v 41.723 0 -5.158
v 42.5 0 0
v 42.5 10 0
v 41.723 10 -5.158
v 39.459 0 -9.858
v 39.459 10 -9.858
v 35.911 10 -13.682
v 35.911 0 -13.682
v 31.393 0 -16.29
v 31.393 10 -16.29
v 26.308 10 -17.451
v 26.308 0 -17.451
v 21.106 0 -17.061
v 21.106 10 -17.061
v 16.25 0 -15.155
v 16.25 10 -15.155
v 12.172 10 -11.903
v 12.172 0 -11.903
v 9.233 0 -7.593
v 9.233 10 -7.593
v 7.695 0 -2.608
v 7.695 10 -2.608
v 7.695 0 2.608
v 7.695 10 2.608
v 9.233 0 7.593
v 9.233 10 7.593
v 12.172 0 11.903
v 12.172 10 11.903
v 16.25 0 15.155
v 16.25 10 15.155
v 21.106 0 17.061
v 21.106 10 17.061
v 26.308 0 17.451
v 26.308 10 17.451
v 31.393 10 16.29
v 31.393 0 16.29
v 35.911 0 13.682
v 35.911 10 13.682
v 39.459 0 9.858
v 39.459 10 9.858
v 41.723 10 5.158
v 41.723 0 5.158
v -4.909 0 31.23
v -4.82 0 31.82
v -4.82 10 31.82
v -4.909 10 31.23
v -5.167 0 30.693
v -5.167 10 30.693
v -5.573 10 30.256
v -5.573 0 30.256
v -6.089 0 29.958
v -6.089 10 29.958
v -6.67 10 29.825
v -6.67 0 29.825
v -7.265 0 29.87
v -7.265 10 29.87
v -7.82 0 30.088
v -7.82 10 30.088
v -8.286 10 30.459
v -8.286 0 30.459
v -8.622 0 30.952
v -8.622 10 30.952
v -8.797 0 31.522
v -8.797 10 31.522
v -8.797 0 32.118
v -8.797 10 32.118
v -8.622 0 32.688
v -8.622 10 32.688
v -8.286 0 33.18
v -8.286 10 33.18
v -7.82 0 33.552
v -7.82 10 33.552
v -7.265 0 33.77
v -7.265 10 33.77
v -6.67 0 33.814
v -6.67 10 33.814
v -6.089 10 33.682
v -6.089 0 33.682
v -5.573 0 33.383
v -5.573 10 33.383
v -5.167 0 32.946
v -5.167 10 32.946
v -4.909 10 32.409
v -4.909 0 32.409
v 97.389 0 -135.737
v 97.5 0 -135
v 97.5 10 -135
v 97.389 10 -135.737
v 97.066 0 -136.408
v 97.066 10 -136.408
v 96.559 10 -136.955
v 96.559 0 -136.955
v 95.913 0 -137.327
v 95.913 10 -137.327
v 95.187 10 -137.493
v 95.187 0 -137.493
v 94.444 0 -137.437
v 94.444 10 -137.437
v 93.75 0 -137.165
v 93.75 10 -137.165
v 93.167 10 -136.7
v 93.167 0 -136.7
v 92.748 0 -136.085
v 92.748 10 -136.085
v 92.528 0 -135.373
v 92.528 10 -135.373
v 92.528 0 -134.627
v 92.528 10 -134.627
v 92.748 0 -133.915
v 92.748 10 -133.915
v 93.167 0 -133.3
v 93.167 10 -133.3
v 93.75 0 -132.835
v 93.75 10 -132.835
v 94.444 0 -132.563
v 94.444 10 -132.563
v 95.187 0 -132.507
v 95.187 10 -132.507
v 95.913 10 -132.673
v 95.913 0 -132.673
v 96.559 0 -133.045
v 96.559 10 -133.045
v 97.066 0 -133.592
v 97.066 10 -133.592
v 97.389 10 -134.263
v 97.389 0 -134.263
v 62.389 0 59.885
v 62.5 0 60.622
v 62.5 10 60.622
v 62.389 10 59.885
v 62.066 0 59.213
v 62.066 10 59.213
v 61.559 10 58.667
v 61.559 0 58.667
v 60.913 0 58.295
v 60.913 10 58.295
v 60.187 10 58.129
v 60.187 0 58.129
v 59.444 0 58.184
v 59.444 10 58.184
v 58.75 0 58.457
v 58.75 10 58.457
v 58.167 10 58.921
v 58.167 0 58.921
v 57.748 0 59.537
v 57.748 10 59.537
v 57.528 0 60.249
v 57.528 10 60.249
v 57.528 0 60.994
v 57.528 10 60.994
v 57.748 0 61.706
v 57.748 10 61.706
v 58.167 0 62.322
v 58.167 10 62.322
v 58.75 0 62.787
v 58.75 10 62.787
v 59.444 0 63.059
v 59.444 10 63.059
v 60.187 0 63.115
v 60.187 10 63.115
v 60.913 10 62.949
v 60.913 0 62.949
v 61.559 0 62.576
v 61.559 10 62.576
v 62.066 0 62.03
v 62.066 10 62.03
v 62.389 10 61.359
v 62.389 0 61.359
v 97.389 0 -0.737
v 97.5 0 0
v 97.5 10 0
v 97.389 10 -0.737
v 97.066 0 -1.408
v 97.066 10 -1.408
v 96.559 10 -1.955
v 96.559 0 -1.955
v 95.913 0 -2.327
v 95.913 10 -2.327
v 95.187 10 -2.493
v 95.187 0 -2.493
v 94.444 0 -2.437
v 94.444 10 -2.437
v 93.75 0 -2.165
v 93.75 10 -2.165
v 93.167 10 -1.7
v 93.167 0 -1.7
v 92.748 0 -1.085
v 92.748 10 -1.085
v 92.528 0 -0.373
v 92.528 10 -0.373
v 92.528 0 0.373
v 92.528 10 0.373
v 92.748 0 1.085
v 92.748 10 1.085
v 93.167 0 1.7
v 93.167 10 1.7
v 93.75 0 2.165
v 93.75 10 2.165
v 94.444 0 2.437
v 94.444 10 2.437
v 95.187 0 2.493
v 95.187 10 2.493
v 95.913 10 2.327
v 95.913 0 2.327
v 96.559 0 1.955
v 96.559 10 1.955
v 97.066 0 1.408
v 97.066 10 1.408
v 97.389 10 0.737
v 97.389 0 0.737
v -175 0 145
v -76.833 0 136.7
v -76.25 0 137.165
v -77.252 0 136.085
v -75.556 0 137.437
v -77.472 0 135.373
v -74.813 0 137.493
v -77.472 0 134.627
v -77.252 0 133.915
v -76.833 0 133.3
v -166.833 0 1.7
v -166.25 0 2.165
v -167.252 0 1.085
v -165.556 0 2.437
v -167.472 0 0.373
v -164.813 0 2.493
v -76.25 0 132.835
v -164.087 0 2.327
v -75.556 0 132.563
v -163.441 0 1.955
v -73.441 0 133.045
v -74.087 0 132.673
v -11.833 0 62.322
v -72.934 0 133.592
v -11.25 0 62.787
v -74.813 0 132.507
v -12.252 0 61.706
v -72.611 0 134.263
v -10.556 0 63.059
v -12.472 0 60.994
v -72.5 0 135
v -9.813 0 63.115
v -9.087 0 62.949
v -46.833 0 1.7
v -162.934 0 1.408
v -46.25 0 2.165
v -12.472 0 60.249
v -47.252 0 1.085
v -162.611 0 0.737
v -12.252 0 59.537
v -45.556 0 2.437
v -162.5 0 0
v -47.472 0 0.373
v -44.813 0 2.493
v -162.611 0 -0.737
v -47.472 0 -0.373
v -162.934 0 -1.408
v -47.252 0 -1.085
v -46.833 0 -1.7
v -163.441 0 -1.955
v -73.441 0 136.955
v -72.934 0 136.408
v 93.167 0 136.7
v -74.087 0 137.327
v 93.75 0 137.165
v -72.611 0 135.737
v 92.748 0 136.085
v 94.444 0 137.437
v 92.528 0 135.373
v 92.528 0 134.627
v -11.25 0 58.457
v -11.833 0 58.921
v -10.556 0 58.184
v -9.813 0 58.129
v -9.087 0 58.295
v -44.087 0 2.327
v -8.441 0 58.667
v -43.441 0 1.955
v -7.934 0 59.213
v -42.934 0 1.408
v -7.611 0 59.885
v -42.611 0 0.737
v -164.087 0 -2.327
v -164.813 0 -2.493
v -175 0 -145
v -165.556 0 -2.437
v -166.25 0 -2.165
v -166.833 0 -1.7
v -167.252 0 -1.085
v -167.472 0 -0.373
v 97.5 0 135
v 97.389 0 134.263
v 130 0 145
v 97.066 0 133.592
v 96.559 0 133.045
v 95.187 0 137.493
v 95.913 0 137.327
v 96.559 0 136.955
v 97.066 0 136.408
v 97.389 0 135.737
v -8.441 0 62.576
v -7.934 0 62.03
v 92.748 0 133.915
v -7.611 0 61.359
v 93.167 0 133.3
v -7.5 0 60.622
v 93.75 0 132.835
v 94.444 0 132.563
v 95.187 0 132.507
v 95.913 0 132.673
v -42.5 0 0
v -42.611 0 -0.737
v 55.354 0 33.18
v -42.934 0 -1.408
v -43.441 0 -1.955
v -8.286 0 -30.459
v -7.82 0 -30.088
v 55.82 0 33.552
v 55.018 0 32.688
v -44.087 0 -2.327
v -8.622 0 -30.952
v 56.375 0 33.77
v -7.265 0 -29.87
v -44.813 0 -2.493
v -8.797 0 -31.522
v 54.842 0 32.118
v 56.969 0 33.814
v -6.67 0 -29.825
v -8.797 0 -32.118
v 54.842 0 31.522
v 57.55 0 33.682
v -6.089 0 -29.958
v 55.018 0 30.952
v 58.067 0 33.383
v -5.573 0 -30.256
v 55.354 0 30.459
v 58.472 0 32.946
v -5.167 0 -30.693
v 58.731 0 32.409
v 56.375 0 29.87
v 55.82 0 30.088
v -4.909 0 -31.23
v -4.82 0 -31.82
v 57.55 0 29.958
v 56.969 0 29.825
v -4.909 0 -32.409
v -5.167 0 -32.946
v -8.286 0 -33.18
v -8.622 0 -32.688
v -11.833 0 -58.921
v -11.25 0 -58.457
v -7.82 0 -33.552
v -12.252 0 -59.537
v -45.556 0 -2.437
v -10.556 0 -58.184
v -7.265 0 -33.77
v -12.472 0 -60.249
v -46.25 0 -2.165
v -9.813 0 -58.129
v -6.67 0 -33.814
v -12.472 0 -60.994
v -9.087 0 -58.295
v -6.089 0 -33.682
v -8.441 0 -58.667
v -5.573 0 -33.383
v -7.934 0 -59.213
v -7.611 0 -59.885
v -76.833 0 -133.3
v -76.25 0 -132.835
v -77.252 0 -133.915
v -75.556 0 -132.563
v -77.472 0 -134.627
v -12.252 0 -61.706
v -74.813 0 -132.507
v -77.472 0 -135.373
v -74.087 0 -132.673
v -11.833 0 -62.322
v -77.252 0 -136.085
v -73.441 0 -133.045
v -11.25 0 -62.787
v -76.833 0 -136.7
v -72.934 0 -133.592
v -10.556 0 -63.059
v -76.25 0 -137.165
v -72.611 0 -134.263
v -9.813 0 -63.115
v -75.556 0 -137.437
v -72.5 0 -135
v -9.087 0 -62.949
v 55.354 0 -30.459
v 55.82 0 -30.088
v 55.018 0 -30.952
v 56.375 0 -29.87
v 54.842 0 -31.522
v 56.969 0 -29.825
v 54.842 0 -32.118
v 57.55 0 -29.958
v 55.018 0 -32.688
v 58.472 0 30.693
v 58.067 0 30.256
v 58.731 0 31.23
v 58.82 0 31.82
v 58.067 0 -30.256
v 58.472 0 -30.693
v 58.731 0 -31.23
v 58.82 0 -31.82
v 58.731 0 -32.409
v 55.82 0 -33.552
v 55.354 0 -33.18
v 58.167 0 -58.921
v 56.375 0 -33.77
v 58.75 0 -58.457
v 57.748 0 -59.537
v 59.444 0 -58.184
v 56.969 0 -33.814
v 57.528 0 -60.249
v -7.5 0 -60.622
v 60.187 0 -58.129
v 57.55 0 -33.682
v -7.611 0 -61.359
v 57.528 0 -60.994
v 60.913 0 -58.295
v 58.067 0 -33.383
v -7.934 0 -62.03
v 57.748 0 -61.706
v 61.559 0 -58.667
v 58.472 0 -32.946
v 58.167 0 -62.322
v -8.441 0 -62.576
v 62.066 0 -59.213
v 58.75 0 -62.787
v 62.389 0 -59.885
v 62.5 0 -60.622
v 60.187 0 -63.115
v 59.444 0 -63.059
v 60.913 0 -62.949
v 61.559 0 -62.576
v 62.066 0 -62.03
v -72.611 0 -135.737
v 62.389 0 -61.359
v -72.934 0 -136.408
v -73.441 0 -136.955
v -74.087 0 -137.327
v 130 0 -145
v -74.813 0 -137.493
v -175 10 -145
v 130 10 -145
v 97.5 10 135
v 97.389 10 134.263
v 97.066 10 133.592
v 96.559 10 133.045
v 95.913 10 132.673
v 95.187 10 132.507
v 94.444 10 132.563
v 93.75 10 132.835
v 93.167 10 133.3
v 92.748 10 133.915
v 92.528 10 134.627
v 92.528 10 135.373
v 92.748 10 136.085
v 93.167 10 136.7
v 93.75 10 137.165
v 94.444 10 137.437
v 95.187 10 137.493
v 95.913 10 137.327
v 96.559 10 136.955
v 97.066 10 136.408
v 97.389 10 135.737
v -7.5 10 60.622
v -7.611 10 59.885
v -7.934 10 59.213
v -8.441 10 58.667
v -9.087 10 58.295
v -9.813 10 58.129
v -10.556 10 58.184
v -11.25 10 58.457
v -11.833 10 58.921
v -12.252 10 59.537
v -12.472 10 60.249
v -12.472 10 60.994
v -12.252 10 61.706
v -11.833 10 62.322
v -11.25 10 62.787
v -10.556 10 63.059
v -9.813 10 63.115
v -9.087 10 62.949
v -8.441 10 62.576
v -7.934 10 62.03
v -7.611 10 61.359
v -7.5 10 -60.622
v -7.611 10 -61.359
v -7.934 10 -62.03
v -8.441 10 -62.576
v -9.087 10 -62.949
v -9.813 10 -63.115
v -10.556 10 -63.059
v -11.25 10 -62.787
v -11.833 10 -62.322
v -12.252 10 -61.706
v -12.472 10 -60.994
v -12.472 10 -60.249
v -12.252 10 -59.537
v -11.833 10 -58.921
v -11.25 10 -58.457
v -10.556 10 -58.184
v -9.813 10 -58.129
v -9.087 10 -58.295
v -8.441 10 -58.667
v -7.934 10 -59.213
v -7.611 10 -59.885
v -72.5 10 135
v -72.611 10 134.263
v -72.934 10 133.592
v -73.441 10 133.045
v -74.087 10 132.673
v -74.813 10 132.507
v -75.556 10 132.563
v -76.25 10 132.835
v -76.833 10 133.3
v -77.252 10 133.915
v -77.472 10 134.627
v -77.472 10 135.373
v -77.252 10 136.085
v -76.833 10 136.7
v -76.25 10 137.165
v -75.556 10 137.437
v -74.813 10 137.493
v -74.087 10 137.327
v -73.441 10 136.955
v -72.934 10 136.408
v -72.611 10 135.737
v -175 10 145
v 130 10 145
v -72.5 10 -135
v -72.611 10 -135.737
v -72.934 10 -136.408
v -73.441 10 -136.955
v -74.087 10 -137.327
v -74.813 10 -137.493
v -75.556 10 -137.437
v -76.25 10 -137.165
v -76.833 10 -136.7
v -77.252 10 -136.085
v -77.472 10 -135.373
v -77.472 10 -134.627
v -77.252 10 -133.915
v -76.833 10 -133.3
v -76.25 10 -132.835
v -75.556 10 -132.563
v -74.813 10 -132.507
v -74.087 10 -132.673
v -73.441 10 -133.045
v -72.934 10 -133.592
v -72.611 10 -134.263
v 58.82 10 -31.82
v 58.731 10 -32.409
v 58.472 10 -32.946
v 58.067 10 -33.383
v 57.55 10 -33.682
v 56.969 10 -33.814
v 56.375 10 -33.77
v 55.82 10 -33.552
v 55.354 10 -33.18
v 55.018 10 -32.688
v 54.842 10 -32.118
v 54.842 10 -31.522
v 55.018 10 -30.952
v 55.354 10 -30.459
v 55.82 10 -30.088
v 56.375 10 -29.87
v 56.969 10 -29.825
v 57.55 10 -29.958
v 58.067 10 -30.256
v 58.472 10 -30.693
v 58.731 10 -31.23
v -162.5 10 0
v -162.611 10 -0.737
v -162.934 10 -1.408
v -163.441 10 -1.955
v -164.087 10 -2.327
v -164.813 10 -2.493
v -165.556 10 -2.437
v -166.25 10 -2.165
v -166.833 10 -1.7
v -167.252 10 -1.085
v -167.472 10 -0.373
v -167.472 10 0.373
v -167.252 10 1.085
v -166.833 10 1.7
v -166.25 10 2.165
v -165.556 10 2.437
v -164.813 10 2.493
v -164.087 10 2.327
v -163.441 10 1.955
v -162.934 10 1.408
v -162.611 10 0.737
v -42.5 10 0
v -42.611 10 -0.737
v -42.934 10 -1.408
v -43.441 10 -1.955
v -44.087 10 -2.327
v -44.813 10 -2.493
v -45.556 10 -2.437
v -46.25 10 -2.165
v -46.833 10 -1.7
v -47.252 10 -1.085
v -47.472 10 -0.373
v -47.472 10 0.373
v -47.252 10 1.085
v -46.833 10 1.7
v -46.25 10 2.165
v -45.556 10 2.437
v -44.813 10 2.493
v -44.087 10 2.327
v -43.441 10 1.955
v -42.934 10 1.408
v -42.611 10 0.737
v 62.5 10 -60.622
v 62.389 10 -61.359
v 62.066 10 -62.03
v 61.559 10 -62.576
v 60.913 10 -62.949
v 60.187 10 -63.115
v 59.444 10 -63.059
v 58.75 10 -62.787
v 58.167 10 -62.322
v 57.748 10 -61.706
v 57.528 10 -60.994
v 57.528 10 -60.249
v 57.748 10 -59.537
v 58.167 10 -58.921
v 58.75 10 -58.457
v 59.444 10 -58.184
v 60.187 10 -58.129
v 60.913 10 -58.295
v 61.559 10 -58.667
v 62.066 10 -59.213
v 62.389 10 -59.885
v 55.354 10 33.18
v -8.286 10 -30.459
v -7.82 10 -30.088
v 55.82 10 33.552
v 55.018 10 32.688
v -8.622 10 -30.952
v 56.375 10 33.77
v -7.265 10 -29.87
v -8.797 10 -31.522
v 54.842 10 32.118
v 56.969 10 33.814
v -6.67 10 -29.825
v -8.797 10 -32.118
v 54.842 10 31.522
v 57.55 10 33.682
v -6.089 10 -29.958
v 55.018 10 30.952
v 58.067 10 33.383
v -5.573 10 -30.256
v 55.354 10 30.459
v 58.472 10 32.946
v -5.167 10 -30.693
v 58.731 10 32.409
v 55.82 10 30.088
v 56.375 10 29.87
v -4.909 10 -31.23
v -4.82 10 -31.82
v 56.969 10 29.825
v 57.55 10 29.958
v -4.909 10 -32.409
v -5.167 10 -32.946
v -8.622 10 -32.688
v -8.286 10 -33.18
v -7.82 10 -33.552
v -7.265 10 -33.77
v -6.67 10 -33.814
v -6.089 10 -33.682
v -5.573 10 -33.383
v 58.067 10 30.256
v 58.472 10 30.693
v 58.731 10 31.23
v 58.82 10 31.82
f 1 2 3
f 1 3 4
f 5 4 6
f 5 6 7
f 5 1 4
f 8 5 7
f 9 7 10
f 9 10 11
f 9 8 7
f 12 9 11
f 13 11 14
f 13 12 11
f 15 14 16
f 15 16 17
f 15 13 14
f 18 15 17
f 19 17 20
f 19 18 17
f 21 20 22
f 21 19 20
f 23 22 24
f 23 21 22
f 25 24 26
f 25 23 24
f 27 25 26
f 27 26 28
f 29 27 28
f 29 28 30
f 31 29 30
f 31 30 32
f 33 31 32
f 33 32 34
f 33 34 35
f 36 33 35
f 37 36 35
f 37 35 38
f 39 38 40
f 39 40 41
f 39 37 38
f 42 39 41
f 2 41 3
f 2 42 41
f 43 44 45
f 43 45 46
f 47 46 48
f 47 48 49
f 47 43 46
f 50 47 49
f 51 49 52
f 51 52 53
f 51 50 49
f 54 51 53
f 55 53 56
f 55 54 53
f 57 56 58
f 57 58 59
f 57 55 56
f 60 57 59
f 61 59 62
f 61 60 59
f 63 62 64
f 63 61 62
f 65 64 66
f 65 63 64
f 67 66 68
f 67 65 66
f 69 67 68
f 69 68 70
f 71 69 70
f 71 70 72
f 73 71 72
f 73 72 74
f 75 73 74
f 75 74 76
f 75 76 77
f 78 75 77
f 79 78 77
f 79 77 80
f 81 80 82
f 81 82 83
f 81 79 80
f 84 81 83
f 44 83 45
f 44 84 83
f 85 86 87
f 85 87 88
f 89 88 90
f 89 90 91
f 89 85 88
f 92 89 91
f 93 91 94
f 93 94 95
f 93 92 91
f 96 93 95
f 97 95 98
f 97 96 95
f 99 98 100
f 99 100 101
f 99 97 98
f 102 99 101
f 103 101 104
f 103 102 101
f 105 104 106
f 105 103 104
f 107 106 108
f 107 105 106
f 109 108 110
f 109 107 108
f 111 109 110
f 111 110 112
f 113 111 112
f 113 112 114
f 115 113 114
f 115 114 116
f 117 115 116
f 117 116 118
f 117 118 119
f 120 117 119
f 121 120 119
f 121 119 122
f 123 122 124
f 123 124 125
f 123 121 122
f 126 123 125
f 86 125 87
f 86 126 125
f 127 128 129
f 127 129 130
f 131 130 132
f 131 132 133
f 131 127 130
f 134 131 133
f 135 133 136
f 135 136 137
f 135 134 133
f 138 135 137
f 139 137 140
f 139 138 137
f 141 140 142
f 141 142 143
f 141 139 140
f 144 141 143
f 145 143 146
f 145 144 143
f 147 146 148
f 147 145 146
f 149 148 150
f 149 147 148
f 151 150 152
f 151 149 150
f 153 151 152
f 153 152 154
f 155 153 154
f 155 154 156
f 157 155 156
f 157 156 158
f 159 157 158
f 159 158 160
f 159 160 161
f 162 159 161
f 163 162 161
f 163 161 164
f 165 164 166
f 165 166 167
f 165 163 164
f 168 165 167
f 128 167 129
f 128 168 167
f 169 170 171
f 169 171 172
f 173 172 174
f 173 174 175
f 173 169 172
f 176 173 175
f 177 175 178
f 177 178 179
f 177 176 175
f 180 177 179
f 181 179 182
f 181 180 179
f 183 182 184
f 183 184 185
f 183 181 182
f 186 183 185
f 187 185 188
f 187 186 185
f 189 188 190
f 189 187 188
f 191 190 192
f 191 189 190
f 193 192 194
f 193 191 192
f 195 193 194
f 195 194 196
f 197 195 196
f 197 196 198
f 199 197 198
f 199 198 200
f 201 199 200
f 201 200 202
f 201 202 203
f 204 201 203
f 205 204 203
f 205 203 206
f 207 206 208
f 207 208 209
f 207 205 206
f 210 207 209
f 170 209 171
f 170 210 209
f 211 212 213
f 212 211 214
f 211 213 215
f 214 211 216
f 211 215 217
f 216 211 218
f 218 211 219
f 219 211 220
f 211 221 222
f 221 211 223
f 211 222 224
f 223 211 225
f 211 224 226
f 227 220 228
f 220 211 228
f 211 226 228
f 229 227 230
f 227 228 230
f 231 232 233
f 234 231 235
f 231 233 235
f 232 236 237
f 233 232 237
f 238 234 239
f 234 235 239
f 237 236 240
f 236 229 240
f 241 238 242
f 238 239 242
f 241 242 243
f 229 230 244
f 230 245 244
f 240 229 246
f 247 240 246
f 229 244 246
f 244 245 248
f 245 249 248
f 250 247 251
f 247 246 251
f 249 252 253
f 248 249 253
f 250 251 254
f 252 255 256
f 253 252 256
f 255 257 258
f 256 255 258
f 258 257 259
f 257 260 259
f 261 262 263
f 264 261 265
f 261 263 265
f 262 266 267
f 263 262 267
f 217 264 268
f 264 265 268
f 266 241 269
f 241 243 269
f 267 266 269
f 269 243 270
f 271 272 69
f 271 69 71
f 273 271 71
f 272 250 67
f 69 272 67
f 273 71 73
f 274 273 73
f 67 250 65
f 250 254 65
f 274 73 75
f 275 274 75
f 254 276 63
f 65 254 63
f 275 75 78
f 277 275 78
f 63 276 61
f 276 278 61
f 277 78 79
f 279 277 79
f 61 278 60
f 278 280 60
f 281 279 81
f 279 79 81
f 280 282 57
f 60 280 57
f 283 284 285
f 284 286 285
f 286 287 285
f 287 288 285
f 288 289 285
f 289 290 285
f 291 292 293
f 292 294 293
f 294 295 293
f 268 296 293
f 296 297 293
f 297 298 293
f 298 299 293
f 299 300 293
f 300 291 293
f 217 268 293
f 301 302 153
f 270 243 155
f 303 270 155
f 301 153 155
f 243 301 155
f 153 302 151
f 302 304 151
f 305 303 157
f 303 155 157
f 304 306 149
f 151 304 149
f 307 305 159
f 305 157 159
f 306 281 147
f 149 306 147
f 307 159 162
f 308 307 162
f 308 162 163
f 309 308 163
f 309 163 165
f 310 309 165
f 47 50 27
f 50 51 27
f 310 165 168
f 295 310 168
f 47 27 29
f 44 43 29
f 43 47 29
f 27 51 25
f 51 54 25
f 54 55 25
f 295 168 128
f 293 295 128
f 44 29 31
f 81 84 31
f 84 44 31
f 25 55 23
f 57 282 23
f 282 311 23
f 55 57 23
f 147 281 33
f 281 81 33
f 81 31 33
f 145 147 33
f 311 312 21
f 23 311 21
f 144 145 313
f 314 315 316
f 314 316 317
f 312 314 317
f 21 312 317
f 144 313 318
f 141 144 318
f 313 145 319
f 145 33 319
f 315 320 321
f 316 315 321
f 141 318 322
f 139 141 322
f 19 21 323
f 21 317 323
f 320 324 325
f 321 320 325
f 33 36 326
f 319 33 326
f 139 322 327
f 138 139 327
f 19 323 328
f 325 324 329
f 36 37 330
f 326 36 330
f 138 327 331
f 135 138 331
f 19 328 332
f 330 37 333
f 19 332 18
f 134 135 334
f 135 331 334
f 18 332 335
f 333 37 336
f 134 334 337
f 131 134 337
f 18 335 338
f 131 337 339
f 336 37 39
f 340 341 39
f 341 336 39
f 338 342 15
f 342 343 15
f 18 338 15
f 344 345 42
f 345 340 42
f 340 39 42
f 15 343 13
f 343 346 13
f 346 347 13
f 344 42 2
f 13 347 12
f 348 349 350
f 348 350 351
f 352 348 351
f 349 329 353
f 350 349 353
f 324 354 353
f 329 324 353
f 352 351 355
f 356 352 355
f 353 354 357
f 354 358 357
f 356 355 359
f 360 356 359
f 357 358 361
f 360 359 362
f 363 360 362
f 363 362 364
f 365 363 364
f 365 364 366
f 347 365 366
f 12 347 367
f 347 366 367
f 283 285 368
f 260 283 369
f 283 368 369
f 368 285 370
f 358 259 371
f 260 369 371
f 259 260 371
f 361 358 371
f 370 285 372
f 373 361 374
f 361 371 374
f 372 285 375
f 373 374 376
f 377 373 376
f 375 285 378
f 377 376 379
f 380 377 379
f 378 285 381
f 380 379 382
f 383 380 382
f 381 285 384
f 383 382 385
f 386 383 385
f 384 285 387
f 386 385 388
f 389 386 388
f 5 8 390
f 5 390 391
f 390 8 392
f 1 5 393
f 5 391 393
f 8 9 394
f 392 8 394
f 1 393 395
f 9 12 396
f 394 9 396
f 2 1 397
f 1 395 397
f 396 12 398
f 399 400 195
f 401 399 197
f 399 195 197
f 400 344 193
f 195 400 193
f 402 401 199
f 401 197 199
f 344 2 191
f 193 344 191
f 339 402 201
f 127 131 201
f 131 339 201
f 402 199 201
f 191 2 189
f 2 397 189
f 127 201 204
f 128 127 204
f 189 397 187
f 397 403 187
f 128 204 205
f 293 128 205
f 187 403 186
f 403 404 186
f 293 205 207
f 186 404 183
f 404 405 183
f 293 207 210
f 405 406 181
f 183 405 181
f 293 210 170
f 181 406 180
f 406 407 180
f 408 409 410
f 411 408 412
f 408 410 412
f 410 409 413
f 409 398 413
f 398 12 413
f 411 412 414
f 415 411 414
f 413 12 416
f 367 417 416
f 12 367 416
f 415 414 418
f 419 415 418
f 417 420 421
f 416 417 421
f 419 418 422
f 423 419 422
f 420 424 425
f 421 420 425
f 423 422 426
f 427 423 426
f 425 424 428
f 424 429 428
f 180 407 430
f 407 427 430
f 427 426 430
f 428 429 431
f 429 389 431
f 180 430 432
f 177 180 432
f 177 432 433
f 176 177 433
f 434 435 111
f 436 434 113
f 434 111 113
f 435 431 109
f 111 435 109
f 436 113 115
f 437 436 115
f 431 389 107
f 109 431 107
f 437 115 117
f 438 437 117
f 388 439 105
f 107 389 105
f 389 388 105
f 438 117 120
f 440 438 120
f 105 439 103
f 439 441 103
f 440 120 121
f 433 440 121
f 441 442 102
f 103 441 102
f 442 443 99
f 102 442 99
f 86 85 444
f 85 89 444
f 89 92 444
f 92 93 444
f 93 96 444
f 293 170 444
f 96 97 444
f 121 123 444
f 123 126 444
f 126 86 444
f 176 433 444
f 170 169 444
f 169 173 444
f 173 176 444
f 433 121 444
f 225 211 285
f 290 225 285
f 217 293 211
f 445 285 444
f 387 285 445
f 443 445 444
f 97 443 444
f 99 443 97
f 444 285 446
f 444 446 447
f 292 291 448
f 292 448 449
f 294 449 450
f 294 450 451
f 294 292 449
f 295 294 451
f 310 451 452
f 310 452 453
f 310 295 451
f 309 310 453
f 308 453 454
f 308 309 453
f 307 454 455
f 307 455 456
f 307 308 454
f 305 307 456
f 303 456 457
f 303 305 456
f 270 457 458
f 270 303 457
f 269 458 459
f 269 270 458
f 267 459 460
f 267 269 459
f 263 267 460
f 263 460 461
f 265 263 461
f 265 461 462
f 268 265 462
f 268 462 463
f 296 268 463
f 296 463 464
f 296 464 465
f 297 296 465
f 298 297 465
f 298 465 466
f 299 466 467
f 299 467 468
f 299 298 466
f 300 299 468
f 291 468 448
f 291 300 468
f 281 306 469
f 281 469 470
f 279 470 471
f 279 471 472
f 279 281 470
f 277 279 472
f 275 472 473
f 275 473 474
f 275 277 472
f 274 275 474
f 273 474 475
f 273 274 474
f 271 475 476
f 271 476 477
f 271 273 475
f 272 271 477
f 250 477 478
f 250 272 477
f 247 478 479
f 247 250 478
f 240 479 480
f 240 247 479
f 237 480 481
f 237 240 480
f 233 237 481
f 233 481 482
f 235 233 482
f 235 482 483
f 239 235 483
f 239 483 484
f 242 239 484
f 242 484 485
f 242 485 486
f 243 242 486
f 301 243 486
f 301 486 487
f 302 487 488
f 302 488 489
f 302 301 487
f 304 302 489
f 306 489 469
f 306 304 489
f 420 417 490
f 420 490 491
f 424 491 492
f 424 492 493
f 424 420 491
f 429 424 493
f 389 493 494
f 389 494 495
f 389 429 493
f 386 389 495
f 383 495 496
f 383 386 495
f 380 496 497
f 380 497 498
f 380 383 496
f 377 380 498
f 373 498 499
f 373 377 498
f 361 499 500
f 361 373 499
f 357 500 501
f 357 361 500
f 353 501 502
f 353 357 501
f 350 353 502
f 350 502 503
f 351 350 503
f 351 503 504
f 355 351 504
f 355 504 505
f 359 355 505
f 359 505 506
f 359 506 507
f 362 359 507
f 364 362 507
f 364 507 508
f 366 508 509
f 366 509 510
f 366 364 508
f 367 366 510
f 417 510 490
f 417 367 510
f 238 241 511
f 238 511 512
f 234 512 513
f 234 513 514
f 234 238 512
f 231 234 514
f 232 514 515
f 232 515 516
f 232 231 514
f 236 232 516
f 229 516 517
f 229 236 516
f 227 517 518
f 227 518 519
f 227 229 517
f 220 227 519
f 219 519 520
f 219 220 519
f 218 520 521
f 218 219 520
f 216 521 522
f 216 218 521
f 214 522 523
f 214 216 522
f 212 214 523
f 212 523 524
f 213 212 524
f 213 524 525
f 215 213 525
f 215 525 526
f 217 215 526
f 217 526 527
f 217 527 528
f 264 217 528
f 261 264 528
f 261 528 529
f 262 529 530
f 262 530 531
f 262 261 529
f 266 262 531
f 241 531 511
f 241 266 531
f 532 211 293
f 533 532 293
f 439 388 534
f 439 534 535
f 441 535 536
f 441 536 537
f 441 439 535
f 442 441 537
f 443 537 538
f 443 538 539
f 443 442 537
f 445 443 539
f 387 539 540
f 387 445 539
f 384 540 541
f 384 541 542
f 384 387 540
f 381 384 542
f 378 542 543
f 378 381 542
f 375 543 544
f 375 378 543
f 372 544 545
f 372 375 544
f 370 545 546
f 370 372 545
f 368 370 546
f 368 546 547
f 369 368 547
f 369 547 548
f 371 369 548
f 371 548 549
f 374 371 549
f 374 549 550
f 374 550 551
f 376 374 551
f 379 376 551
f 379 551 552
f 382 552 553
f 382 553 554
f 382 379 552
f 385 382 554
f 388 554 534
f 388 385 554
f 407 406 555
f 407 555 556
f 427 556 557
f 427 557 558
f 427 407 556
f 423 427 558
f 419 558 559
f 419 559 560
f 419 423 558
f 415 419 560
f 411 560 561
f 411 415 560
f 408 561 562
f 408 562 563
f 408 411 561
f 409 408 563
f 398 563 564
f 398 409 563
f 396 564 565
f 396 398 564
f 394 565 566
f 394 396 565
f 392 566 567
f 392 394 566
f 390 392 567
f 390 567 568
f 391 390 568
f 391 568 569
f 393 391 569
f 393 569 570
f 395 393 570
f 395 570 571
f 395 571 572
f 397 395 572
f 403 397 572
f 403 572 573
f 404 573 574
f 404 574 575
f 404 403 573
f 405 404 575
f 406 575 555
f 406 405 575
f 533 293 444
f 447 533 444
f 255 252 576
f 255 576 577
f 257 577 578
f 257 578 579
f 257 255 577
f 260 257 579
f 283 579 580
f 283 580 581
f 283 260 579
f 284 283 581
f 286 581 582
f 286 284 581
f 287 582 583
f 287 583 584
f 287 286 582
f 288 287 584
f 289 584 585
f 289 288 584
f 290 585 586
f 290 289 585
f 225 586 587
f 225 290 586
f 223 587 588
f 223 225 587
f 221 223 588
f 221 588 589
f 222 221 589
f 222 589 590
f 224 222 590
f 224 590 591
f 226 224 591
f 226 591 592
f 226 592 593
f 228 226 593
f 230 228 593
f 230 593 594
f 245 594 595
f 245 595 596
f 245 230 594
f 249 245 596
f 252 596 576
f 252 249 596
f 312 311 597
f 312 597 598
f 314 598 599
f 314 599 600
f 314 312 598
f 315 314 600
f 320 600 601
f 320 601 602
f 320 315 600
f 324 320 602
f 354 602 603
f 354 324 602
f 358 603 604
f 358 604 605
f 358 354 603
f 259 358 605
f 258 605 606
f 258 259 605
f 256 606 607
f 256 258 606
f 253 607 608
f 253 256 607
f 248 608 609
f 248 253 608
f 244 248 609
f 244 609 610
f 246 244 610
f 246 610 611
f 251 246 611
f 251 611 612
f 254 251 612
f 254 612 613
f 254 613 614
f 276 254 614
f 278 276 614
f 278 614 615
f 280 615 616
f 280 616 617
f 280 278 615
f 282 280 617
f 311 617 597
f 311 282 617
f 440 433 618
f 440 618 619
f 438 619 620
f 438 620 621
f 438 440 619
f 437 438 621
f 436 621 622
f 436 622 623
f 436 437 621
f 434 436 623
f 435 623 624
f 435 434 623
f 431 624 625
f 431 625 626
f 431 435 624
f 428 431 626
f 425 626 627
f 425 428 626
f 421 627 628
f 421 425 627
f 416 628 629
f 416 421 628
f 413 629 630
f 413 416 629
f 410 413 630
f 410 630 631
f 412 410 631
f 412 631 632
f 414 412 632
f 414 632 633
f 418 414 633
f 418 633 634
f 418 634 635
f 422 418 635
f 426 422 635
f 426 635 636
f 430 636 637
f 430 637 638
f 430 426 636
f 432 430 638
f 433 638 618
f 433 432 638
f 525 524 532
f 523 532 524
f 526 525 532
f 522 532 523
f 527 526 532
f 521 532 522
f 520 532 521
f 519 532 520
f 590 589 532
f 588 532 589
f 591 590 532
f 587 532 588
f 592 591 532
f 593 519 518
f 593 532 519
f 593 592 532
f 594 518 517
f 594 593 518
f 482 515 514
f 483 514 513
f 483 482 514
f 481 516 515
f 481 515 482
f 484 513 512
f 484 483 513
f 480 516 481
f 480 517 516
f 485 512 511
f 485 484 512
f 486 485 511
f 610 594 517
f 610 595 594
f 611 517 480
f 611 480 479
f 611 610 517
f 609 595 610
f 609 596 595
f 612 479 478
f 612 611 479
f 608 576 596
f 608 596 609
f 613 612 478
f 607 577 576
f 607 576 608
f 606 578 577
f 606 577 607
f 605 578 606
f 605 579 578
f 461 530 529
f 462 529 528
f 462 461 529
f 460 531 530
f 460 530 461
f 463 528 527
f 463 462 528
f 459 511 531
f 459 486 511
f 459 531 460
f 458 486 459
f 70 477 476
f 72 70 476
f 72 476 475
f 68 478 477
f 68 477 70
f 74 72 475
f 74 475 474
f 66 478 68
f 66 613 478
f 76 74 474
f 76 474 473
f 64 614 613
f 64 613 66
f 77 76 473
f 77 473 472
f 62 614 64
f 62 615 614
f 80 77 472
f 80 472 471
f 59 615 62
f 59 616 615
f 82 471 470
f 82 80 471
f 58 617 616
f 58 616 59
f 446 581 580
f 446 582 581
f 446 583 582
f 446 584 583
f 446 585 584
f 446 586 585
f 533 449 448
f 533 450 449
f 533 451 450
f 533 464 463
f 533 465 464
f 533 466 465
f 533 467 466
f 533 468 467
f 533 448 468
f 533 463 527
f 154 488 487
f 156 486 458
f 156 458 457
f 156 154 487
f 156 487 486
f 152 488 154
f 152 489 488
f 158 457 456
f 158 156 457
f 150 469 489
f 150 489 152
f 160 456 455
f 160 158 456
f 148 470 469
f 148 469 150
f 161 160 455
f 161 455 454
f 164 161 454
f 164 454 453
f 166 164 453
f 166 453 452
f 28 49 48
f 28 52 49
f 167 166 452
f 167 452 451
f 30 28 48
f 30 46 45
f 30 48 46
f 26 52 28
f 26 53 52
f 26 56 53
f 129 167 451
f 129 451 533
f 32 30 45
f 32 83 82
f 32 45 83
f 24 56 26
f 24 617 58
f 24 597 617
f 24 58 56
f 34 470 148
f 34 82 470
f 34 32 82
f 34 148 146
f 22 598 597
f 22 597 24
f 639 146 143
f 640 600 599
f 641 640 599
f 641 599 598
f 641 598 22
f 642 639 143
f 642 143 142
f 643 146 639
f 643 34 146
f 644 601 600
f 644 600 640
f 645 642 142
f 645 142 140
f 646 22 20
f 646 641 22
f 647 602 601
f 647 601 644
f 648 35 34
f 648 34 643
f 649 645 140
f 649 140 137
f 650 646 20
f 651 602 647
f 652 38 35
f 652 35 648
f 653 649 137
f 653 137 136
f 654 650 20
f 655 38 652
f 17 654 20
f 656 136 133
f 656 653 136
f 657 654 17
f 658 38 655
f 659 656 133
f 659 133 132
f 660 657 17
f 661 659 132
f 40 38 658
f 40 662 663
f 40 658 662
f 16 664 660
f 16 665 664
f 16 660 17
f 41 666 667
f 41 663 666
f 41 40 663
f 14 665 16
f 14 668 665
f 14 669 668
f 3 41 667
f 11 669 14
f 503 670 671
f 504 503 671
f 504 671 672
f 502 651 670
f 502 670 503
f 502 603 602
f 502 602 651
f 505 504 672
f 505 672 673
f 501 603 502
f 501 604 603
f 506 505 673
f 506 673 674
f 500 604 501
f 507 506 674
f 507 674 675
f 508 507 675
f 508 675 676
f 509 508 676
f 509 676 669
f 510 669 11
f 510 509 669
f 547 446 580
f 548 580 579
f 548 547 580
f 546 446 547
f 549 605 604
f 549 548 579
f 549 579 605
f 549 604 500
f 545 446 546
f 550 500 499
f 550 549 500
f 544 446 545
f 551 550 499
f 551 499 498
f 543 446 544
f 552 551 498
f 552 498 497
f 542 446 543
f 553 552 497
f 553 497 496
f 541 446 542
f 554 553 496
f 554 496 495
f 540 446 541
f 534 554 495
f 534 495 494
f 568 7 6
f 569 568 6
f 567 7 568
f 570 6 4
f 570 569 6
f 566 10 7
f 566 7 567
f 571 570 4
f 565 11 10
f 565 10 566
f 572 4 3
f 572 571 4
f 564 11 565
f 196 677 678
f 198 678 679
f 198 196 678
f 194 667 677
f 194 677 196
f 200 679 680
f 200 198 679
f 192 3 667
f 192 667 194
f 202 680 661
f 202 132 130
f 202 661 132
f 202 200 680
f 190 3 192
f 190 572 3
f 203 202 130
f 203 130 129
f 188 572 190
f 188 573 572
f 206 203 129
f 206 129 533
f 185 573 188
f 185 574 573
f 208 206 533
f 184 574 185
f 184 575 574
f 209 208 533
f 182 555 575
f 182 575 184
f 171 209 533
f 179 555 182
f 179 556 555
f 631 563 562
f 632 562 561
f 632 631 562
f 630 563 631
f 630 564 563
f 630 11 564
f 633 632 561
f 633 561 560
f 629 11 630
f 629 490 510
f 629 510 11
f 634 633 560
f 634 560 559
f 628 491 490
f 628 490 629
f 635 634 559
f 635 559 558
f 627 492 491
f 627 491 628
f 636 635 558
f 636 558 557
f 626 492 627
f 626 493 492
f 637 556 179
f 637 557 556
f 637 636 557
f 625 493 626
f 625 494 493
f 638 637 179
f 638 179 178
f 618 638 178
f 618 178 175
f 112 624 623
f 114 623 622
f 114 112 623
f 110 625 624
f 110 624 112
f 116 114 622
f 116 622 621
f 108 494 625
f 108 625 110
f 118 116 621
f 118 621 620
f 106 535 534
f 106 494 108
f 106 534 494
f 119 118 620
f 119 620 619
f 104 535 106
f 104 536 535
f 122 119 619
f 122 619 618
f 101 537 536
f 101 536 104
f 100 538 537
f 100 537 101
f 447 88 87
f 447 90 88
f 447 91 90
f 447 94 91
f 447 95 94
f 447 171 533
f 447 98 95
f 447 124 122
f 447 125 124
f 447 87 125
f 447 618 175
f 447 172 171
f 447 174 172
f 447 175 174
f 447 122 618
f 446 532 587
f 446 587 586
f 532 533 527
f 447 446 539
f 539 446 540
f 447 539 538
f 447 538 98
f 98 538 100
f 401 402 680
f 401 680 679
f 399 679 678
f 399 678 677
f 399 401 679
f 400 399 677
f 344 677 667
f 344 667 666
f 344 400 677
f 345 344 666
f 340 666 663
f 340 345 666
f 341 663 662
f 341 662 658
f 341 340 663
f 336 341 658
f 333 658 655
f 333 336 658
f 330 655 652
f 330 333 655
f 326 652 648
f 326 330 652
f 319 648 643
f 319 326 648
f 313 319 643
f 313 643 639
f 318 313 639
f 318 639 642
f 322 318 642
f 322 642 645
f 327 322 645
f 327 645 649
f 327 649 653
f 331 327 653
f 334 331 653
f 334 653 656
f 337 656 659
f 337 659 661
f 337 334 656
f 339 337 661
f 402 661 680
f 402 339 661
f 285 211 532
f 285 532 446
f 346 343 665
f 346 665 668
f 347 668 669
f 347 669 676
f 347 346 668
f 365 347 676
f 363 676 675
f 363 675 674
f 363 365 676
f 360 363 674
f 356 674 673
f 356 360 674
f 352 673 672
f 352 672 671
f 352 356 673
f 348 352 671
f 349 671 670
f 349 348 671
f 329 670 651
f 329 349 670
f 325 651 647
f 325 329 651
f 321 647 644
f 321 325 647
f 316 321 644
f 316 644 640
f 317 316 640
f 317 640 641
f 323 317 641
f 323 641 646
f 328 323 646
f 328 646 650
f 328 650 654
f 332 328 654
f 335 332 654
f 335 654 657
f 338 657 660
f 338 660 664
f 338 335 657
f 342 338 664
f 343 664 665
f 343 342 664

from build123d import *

# Parameters (mm, degrees)
SKETCH1_W           = 305
SKETCH1_H           = 290
SKETCH1_R           = 17.5
SKETCH1_R_2         = 2.5
SKETCH1_R_3         = 2
BOSS_EXTRUDE1_DEPTH = 10


with BuildPart() as part:
    # Sketch1 → Boss-Extrude1 (new body)
    with BuildSketch(Plane(origin=(0, 0, 0), x_dir=(1, 0, 0), z_dir=(0, 1, 0))):
        with Locations((-22.5, 0)):
            Rectangle(SKETCH1_W, SKETCH1_H)
        with Locations((25, 0)):
            Circle(SKETCH1_R, mode=Mode.SUBTRACT)
        with Locations((95, 0)):
            Circle(SKETCH1_R_2, mode=Mode.SUBTRACT)
        with Locations((56.819805153, 31.819805153)):
            Circle(SKETCH1_R_3, mode=Mode.SUBTRACT)
        with Locations((60, -60.621778265)):
            Circle(SKETCH1_R_2, mode=Mode.SUBTRACT)
        with Locations((-10, -60.621778265)):
            Circle(SKETCH1_R_2, mode=Mode.SUBTRACT)
        with Locations((-45, 0)):
            Circle(SKETCH1_R_2, mode=Mode.SUBTRACT)
        with Locations((56.819805153, -31.819805153)):
            Circle(SKETCH1_R_3, mode=Mode.SUBTRACT)
        with Locations((-6.819805153, -31.819805153)):
            Circle(SKETCH1_R_3, mode=Mode.SUBTRACT)
        with Locations((-6.819805153, 31.819805153)):
            Circle(SKETCH1_R_3, mode=Mode.SUBTRACT)
        with Locations((-165, 0)):
            Circle(SKETCH1_R_2, mode=Mode.SUBTRACT)
        with Locations((-75, -135)):
            Circle(SKETCH1_R_2, mode=Mode.SUBTRACT)
        with Locations((95, -135)):
            Circle(SKETCH1_R_2, mode=Mode.SUBTRACT)
        with Locations((95, 135)):
            Circle(SKETCH1_R_2, mode=Mode.SUBTRACT)
        with Locations((-75, 135)):
            Circle(SKETCH1_R_2, mode=Mode.SUBTRACT)
        with Locations((-10, 60.621778265)):
            Circle(SKETCH1_R_2, mode=Mode.SUBTRACT)
        with Locations((60, 60.621778265)):
            Circle(SKETCH1_R_2, mode=Mode.SUBTRACT)
    extrude(amount=BOSS_EXTRUDE1_DEPTH)


solid = part.part
